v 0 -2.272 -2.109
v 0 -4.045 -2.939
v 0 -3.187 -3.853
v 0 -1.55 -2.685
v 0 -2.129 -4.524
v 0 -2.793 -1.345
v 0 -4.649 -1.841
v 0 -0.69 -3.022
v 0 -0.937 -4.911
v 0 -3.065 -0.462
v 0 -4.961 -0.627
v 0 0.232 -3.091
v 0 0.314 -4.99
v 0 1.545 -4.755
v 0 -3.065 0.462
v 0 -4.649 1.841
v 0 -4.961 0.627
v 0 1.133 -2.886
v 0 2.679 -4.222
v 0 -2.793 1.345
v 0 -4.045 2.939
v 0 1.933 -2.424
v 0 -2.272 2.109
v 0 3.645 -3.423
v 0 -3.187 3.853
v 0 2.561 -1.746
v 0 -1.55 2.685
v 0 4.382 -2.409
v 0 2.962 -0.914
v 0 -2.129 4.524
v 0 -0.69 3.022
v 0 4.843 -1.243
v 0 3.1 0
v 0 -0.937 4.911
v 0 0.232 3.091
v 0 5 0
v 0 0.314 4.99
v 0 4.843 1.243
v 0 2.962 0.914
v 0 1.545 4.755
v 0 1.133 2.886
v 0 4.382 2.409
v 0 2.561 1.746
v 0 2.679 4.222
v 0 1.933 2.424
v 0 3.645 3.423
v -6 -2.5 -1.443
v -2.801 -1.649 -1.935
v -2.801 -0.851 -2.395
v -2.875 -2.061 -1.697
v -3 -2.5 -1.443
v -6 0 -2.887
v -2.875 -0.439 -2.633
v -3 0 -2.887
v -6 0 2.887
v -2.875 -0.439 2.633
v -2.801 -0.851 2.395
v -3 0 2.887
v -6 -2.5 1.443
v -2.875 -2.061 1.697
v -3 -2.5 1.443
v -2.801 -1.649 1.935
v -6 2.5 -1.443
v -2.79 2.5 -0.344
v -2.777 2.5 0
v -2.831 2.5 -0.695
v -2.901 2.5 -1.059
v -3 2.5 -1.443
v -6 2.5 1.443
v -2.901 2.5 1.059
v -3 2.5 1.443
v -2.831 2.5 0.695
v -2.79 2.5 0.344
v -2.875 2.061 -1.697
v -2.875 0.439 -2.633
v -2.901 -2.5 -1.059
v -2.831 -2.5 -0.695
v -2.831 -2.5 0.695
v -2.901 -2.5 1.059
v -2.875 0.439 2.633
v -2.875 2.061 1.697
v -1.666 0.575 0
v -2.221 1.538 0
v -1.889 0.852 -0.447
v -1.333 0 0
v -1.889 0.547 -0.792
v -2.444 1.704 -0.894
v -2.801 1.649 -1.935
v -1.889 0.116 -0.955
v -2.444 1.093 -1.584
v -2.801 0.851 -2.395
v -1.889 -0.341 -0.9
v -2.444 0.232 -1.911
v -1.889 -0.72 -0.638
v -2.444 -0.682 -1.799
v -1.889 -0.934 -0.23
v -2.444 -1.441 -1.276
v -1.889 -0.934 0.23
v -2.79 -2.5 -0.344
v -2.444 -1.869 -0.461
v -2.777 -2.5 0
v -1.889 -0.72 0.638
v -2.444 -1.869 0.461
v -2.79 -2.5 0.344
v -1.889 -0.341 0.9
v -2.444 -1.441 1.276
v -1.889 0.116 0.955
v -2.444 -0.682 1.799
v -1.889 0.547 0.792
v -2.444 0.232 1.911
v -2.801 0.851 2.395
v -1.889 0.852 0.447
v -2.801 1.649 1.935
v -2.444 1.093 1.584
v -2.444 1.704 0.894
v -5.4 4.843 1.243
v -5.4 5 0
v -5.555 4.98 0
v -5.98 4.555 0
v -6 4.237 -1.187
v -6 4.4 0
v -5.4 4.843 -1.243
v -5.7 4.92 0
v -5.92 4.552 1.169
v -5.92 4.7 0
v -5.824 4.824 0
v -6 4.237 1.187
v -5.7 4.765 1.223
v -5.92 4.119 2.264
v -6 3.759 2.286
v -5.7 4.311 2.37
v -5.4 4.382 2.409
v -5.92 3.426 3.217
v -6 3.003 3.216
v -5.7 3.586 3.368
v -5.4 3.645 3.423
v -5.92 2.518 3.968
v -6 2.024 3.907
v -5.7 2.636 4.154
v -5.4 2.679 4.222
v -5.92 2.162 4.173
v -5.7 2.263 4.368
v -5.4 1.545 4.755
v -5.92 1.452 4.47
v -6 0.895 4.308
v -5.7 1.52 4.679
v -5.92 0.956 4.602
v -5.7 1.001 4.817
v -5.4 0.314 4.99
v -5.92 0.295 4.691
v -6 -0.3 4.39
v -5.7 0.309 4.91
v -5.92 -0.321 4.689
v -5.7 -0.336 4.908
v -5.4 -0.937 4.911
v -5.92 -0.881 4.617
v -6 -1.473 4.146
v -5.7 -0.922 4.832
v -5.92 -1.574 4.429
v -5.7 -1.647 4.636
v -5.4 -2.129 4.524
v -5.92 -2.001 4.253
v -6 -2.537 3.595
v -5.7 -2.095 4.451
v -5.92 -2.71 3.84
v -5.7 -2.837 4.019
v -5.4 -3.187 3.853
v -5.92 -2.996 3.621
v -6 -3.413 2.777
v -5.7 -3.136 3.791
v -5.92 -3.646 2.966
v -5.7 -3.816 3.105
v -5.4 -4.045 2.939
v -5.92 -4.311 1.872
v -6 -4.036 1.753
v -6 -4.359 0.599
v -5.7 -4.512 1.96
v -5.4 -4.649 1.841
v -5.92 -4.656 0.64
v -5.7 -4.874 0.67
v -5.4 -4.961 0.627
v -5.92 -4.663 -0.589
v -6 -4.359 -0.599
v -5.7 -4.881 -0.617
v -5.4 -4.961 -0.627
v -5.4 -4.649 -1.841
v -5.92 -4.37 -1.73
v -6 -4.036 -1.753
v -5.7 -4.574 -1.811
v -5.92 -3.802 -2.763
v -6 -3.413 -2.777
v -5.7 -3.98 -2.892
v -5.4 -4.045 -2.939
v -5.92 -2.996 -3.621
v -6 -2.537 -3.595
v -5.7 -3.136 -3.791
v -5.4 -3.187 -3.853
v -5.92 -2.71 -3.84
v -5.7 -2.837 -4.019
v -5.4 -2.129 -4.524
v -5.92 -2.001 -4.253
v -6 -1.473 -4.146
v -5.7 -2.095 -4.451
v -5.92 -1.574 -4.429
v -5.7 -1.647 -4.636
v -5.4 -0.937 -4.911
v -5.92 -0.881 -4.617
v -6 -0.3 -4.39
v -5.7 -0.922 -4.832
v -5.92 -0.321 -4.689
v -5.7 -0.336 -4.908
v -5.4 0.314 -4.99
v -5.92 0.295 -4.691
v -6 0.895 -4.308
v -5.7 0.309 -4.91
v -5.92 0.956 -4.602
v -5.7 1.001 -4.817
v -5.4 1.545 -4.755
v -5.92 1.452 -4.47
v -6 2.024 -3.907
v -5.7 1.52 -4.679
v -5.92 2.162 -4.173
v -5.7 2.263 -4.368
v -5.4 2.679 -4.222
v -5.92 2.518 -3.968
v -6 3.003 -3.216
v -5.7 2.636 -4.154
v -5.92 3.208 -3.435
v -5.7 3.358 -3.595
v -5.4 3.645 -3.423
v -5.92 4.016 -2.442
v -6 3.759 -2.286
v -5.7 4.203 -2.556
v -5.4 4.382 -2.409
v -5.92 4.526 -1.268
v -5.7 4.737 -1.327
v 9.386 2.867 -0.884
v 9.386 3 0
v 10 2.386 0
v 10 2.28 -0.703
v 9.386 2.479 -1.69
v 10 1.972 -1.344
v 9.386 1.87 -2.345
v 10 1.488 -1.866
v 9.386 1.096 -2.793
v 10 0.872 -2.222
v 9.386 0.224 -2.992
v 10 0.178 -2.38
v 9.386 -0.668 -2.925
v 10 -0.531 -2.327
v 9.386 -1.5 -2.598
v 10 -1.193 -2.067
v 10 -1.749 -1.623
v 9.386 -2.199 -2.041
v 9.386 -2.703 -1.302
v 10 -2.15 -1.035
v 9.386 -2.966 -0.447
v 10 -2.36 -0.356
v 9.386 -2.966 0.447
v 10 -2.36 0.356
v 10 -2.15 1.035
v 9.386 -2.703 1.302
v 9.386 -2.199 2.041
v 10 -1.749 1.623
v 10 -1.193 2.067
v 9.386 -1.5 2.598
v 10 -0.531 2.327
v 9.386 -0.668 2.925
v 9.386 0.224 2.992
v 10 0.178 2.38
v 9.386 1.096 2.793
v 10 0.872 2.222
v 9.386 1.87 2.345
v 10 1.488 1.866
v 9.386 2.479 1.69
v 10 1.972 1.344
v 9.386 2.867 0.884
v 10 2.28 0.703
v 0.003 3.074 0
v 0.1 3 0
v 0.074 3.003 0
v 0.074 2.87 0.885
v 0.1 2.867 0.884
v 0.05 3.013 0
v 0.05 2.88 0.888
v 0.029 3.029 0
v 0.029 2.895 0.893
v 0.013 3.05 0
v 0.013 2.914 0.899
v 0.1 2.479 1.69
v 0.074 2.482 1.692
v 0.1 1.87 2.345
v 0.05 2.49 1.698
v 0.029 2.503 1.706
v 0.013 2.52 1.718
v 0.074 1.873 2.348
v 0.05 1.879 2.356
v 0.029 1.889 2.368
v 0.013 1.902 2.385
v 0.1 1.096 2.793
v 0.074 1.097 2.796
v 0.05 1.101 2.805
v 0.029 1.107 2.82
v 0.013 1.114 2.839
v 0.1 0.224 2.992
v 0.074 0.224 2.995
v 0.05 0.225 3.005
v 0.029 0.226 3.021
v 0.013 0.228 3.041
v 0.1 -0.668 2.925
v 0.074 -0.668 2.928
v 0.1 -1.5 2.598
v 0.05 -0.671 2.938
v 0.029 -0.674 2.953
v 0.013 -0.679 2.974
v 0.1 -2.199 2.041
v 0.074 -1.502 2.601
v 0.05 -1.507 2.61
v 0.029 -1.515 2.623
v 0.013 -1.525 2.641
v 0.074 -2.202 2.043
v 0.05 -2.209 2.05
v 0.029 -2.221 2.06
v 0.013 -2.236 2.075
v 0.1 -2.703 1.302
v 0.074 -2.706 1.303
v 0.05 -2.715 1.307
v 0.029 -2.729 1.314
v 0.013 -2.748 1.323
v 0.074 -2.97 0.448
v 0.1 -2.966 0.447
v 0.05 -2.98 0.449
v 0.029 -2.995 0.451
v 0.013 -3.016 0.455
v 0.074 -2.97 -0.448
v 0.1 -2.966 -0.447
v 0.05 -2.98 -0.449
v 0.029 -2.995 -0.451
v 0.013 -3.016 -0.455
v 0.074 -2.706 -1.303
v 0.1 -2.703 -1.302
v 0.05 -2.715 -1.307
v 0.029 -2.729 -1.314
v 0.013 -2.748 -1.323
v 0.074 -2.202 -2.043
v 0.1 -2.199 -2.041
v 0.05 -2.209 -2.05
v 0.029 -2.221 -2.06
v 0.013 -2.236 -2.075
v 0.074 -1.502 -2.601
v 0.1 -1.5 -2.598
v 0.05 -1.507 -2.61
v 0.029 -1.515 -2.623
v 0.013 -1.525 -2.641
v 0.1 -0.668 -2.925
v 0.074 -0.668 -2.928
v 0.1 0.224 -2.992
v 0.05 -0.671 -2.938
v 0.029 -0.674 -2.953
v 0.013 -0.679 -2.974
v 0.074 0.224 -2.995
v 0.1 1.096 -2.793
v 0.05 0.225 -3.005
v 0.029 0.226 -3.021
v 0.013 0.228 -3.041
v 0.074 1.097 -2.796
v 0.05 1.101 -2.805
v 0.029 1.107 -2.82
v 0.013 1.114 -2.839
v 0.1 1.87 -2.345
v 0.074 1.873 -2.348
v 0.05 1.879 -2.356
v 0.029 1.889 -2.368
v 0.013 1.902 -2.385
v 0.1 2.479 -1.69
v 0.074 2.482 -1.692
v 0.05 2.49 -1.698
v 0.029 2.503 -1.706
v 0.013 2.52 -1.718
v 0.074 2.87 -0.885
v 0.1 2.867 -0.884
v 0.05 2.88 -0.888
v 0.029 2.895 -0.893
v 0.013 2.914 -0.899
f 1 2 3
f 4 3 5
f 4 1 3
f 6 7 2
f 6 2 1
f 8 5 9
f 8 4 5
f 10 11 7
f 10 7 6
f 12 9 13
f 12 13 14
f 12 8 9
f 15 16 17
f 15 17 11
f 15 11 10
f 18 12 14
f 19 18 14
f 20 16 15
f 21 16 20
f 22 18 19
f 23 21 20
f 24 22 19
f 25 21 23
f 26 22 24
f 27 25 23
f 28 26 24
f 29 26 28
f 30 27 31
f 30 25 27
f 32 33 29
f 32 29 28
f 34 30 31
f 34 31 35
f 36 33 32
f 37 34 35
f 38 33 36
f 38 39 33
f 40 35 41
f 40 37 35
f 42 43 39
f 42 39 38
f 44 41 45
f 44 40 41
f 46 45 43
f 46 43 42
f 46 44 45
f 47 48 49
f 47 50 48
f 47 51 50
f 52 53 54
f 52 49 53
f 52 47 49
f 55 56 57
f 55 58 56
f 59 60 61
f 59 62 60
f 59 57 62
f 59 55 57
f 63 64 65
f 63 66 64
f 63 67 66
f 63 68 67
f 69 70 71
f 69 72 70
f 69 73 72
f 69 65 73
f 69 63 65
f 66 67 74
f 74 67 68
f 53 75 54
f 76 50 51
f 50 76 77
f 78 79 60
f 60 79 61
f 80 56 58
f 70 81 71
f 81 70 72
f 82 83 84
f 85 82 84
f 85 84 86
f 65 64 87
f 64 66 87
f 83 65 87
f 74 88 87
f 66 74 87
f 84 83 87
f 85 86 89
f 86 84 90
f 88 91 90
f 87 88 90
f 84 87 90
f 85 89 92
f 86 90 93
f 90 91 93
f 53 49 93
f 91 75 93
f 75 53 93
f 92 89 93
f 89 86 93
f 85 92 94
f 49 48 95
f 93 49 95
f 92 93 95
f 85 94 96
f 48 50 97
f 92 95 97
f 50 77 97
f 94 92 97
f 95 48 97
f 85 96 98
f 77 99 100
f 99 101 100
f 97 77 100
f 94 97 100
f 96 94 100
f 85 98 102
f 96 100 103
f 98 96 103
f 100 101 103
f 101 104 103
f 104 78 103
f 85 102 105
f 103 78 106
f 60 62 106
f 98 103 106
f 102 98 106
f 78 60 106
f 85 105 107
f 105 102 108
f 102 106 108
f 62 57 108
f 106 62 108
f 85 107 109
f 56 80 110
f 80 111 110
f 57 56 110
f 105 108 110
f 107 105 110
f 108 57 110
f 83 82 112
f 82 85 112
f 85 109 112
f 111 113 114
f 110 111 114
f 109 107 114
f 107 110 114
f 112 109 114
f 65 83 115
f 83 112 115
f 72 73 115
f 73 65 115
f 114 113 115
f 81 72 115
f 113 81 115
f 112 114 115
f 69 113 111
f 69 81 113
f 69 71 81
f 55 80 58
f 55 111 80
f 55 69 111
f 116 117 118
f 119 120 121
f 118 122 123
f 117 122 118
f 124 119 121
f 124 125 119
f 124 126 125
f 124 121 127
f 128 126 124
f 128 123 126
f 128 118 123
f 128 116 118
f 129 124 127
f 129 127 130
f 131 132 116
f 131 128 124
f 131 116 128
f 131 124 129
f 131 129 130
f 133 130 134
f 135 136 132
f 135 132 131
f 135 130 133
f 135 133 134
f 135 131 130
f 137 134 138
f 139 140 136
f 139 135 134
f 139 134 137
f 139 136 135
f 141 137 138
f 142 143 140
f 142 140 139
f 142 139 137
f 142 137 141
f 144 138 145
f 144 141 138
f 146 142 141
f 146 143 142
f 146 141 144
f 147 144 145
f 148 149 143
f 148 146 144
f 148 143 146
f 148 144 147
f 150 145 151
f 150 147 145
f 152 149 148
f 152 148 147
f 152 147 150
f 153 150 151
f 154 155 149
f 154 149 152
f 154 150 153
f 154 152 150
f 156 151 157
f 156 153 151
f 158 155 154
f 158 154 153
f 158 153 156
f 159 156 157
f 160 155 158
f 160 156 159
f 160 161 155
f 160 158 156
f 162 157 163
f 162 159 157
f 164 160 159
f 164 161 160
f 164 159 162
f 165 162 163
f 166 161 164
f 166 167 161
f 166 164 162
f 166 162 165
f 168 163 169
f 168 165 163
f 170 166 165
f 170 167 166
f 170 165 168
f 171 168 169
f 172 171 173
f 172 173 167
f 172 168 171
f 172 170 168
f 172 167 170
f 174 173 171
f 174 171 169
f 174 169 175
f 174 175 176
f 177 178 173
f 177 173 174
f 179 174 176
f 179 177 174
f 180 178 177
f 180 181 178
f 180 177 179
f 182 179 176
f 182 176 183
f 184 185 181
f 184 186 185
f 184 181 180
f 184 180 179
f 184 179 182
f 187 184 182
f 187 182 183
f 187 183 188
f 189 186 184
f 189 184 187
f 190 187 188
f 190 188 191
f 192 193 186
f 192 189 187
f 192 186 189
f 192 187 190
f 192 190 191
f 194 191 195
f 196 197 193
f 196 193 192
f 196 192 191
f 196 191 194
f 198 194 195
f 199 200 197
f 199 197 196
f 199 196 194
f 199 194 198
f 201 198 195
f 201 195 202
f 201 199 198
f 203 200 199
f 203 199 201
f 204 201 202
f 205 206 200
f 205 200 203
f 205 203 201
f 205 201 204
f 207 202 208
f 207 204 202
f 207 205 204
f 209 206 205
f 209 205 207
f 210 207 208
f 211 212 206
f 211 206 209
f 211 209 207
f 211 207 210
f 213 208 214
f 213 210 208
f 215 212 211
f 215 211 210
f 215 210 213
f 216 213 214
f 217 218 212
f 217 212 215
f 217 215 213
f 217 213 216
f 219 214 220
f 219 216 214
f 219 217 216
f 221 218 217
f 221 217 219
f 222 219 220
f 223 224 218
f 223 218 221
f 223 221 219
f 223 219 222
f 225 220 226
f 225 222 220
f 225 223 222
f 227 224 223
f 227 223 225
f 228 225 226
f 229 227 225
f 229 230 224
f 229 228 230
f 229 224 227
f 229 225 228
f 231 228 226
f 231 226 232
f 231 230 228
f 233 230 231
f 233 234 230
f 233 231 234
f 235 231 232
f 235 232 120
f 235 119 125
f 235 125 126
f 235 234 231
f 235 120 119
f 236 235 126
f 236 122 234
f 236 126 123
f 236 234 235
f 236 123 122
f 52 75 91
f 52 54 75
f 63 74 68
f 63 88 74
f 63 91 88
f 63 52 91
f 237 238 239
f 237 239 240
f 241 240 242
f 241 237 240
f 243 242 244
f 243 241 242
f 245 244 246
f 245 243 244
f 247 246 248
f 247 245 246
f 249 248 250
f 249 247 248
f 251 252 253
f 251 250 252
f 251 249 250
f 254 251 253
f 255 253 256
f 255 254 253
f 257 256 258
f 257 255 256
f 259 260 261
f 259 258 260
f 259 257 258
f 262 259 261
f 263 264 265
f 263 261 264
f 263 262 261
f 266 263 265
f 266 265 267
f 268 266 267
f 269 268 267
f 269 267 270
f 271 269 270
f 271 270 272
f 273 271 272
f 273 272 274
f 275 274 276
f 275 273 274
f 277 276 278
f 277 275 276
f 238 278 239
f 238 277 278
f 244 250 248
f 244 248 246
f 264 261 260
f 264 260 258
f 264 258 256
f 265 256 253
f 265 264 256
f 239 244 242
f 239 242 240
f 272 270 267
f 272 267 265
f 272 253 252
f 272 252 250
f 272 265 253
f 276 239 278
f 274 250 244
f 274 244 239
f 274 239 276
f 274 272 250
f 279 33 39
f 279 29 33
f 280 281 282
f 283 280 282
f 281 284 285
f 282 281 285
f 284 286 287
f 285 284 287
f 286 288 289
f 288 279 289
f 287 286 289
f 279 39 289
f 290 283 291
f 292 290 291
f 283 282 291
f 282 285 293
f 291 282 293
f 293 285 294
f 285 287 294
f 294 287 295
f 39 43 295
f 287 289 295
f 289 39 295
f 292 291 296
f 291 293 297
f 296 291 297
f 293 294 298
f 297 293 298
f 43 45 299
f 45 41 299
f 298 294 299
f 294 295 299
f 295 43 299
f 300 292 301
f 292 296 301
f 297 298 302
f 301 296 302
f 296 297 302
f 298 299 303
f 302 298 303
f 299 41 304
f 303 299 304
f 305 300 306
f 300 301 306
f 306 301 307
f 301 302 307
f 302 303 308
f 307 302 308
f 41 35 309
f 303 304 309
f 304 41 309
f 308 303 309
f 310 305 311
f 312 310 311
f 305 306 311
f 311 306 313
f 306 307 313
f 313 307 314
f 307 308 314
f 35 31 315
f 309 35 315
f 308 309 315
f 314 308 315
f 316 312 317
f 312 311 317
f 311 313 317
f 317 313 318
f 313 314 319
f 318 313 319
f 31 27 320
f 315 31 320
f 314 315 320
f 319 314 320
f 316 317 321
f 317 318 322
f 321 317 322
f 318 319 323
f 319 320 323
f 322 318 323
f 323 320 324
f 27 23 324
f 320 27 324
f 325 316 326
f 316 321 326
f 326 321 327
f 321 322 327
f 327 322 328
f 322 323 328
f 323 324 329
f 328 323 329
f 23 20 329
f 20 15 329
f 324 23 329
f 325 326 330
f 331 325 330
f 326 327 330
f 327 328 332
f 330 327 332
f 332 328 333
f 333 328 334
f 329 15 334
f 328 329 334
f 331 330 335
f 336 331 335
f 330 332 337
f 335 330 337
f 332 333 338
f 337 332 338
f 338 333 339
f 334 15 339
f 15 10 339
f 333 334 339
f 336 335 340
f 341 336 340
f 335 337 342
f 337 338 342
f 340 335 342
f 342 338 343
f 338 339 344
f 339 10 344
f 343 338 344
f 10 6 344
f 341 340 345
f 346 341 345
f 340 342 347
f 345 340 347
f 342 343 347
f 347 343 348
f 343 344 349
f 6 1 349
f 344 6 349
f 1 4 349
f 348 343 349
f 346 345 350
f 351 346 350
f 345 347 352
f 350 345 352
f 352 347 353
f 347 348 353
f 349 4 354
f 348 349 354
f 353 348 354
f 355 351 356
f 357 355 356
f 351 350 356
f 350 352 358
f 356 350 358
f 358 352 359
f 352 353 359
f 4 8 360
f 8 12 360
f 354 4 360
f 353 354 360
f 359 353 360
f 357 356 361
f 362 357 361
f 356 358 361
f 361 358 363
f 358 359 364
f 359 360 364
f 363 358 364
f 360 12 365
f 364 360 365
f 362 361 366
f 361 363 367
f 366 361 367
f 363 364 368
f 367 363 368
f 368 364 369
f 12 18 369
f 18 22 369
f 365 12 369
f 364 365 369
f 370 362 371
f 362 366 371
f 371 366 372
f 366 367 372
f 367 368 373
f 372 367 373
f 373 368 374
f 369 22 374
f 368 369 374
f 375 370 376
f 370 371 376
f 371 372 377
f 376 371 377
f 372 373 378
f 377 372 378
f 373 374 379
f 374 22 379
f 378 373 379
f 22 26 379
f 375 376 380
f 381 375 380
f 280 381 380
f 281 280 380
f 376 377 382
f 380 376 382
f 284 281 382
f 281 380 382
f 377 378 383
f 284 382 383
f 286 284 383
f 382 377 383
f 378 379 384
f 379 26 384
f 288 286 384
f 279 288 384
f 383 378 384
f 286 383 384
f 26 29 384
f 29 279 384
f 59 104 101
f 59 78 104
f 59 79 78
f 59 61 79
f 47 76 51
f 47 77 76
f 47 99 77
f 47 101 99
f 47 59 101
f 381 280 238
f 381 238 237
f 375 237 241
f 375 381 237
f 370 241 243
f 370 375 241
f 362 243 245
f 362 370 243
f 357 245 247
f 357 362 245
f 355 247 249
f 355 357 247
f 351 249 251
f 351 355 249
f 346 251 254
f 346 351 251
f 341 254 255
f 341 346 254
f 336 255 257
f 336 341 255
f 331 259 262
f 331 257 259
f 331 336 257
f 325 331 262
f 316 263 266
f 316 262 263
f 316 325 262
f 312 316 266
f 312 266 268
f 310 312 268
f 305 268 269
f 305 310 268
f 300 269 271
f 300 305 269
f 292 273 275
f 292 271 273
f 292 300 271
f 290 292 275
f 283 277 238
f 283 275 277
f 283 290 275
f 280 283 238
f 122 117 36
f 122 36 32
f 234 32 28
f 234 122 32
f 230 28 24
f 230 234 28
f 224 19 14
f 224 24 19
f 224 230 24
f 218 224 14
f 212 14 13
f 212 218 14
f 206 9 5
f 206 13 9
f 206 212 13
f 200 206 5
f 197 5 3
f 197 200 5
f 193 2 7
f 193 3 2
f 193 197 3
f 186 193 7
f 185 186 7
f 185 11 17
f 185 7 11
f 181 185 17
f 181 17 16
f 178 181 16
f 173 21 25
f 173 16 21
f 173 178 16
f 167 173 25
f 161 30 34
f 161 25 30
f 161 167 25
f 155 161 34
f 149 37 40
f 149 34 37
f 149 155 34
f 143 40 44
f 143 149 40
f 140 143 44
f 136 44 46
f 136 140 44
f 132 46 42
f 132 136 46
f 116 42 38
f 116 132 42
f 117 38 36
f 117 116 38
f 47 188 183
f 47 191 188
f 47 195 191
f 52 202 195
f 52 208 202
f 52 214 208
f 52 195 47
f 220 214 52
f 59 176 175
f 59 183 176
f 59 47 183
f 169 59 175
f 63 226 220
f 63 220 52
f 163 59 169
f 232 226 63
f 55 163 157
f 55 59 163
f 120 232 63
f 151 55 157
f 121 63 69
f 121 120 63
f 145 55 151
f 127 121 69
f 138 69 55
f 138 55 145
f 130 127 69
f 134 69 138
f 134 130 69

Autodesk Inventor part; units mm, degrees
ref_plane "YZ Plane" through (0, 0, 0) normal (1, 0, 0) x (0, 1, 0)
ref_plane "XZ Plane" through (0, 0, 0) normal (0, 1, 0) x (-1, 0, 0)
sketch "Sketch1" plane through (0, 0, 0) normal (0, 0, 1) x (1, 0, 0)
  line L0 (-1.3333, 0) -> (10, 0)
  line L1 (10, 0) -> (10, 3)
  line L2 (10, 3) -> (2.5, 3)
  line L3 (2.5, 3) -> (1.8865, 3)
  line L4 (1.8865, 3) -> (0, 3)
  line L5 (0, 3) -> (0, 5)
  line L6 (0, 5) -> (-6, 5)
  line L7 (-6, 5) -> (-6, 2.8868)
  line L8 (-6, 2.8868) -> (-3, 2.8868)
  line L9 (-3, 2.8868) -> (-1.3333, 0)
  line L10 (-9.2, 0) -> (13.2, 0) projected
  line L11 (0, -1) -> (0, 6) projected
  line L12 (2.5, 3) -> (0, 3) construction
  dimension "d1" = 7.5
  dimension "d2" = 0.6136
  dimension "d3" = 6
  dimension "d4" = 3
  dimension "d5" = 60
  dimension "d6" = 6
  dimension "d7" = 6
  dimension "d8" = 5.7735
  dimension "d9" = 10
  dimension "d26" = 10
revolve "Body" add sketch "Sketch1" angle 360 about axis through (-1.3333, 0, 0) along (1, 0, 0)
sketch "Sketch2" plane through (-6, 0, 0) normal (-1, 0, 0) x (0, 0, 1)
  circle A0 centre (0, 0) radius 2.8868 projected
  line L0 (0, -7) -> (0, 7) projected
  line L1 (-7, 0) -> (7, 0) projected
  line L2 (2.8868, 0) -> (1.4434, -2.5)
  line L3 (1.4434, -2.5) -> (-1.4434, -2.5)
  line L4 (-1.4434, -2.5) -> (-2.8868, 0)
  line L5 (-2.8868, 0) -> (-1.4434, 2.5)
  line L6 (-1.4434, 2.5) -> (1.4434, 2.5)
  line L7 (1.4434, 2.5) -> (2.8868, 0)
extrude "Slot" add sketch "Sketch2" against normal up to next contours L7 A0 | A0 L2 | L6 L0 A0 | A0 L0 L3 | L0 L6 A0 | A0 L3 L0 | L4 A0 | A0 L5
fillet "Fillet1" radius 0.6 1 edges at (-6, -5, 0)
thread "Thread" size "M6x1" class "6g" standard "ISO Metric profile" length 7.5
chamfer "Chamfer1" distance 0.6135 distance2 0.6135 1 edges at (10, -3, 0) measured on face at (10, 0.705, 0.3049)
ref_plane "Work Plane1" through (29, 0, 0) normal (0, -1, 0) x (1, 0, 0)
fillet "Fillet2" radius 0.1 1 edges at (0, -3, 0)
equation "\"d1\" = GEL"
equation "\"d3\" = KOH"
equation "\"d4\" = INTI"
equation "\"d6\" = GD"
equation "\"d7\" = BDM"
equation "\"d8\" = 1.1547 * SW"
equation "\"d9\" = KOD"
equation "\"d26\" = NLG"
equation "\"d30\" = R"
equation "\"d17\" = RR"
equation "\"d13\" = GEL"
equation "\"d15\" = -0.5 * SPD + 0.5 * GD"
equation "\"d16\" = GUL"
equation "\"GD\" = NND"
equation "\"NLG\" = 10"
equation "\"GEL\" = 7.5"
equation "\"KOD\" = 10"
equation "\"KOH\" = NND"
equation "\"INTI\" = 3"
equation "\"GAL\" = 0.61345 * PTC"
equation "\"GUL\" = 0.61345 * PTC"
equation "\"BDM\" = NND"
equation "\"SW\" = 5"
equation "\"RR\" = 0.1 * NND"
equation "\"SPD\" = NND - 1.2269 * PTC"
equation "\"R\" = 0.1"
equation "\"PHH\" = 0.2"
equation "\"GD1\" = THREADDIA - 1.2269 * PTC"
equation "\"THREADDIA\" = 6"
equation "\"FAWI\" = 45deg"
equation "\"PTC\" = 1"
equation "\"KOH1\" = 5.4"
equation "\"NND\" = 6"
equation "\"TOA\" = 30deg"
equation "\"E0\" = 1.155 * SW"
properties part number "AS 1420 - 1973 - M6 x 10" material "Steel, Mild"
